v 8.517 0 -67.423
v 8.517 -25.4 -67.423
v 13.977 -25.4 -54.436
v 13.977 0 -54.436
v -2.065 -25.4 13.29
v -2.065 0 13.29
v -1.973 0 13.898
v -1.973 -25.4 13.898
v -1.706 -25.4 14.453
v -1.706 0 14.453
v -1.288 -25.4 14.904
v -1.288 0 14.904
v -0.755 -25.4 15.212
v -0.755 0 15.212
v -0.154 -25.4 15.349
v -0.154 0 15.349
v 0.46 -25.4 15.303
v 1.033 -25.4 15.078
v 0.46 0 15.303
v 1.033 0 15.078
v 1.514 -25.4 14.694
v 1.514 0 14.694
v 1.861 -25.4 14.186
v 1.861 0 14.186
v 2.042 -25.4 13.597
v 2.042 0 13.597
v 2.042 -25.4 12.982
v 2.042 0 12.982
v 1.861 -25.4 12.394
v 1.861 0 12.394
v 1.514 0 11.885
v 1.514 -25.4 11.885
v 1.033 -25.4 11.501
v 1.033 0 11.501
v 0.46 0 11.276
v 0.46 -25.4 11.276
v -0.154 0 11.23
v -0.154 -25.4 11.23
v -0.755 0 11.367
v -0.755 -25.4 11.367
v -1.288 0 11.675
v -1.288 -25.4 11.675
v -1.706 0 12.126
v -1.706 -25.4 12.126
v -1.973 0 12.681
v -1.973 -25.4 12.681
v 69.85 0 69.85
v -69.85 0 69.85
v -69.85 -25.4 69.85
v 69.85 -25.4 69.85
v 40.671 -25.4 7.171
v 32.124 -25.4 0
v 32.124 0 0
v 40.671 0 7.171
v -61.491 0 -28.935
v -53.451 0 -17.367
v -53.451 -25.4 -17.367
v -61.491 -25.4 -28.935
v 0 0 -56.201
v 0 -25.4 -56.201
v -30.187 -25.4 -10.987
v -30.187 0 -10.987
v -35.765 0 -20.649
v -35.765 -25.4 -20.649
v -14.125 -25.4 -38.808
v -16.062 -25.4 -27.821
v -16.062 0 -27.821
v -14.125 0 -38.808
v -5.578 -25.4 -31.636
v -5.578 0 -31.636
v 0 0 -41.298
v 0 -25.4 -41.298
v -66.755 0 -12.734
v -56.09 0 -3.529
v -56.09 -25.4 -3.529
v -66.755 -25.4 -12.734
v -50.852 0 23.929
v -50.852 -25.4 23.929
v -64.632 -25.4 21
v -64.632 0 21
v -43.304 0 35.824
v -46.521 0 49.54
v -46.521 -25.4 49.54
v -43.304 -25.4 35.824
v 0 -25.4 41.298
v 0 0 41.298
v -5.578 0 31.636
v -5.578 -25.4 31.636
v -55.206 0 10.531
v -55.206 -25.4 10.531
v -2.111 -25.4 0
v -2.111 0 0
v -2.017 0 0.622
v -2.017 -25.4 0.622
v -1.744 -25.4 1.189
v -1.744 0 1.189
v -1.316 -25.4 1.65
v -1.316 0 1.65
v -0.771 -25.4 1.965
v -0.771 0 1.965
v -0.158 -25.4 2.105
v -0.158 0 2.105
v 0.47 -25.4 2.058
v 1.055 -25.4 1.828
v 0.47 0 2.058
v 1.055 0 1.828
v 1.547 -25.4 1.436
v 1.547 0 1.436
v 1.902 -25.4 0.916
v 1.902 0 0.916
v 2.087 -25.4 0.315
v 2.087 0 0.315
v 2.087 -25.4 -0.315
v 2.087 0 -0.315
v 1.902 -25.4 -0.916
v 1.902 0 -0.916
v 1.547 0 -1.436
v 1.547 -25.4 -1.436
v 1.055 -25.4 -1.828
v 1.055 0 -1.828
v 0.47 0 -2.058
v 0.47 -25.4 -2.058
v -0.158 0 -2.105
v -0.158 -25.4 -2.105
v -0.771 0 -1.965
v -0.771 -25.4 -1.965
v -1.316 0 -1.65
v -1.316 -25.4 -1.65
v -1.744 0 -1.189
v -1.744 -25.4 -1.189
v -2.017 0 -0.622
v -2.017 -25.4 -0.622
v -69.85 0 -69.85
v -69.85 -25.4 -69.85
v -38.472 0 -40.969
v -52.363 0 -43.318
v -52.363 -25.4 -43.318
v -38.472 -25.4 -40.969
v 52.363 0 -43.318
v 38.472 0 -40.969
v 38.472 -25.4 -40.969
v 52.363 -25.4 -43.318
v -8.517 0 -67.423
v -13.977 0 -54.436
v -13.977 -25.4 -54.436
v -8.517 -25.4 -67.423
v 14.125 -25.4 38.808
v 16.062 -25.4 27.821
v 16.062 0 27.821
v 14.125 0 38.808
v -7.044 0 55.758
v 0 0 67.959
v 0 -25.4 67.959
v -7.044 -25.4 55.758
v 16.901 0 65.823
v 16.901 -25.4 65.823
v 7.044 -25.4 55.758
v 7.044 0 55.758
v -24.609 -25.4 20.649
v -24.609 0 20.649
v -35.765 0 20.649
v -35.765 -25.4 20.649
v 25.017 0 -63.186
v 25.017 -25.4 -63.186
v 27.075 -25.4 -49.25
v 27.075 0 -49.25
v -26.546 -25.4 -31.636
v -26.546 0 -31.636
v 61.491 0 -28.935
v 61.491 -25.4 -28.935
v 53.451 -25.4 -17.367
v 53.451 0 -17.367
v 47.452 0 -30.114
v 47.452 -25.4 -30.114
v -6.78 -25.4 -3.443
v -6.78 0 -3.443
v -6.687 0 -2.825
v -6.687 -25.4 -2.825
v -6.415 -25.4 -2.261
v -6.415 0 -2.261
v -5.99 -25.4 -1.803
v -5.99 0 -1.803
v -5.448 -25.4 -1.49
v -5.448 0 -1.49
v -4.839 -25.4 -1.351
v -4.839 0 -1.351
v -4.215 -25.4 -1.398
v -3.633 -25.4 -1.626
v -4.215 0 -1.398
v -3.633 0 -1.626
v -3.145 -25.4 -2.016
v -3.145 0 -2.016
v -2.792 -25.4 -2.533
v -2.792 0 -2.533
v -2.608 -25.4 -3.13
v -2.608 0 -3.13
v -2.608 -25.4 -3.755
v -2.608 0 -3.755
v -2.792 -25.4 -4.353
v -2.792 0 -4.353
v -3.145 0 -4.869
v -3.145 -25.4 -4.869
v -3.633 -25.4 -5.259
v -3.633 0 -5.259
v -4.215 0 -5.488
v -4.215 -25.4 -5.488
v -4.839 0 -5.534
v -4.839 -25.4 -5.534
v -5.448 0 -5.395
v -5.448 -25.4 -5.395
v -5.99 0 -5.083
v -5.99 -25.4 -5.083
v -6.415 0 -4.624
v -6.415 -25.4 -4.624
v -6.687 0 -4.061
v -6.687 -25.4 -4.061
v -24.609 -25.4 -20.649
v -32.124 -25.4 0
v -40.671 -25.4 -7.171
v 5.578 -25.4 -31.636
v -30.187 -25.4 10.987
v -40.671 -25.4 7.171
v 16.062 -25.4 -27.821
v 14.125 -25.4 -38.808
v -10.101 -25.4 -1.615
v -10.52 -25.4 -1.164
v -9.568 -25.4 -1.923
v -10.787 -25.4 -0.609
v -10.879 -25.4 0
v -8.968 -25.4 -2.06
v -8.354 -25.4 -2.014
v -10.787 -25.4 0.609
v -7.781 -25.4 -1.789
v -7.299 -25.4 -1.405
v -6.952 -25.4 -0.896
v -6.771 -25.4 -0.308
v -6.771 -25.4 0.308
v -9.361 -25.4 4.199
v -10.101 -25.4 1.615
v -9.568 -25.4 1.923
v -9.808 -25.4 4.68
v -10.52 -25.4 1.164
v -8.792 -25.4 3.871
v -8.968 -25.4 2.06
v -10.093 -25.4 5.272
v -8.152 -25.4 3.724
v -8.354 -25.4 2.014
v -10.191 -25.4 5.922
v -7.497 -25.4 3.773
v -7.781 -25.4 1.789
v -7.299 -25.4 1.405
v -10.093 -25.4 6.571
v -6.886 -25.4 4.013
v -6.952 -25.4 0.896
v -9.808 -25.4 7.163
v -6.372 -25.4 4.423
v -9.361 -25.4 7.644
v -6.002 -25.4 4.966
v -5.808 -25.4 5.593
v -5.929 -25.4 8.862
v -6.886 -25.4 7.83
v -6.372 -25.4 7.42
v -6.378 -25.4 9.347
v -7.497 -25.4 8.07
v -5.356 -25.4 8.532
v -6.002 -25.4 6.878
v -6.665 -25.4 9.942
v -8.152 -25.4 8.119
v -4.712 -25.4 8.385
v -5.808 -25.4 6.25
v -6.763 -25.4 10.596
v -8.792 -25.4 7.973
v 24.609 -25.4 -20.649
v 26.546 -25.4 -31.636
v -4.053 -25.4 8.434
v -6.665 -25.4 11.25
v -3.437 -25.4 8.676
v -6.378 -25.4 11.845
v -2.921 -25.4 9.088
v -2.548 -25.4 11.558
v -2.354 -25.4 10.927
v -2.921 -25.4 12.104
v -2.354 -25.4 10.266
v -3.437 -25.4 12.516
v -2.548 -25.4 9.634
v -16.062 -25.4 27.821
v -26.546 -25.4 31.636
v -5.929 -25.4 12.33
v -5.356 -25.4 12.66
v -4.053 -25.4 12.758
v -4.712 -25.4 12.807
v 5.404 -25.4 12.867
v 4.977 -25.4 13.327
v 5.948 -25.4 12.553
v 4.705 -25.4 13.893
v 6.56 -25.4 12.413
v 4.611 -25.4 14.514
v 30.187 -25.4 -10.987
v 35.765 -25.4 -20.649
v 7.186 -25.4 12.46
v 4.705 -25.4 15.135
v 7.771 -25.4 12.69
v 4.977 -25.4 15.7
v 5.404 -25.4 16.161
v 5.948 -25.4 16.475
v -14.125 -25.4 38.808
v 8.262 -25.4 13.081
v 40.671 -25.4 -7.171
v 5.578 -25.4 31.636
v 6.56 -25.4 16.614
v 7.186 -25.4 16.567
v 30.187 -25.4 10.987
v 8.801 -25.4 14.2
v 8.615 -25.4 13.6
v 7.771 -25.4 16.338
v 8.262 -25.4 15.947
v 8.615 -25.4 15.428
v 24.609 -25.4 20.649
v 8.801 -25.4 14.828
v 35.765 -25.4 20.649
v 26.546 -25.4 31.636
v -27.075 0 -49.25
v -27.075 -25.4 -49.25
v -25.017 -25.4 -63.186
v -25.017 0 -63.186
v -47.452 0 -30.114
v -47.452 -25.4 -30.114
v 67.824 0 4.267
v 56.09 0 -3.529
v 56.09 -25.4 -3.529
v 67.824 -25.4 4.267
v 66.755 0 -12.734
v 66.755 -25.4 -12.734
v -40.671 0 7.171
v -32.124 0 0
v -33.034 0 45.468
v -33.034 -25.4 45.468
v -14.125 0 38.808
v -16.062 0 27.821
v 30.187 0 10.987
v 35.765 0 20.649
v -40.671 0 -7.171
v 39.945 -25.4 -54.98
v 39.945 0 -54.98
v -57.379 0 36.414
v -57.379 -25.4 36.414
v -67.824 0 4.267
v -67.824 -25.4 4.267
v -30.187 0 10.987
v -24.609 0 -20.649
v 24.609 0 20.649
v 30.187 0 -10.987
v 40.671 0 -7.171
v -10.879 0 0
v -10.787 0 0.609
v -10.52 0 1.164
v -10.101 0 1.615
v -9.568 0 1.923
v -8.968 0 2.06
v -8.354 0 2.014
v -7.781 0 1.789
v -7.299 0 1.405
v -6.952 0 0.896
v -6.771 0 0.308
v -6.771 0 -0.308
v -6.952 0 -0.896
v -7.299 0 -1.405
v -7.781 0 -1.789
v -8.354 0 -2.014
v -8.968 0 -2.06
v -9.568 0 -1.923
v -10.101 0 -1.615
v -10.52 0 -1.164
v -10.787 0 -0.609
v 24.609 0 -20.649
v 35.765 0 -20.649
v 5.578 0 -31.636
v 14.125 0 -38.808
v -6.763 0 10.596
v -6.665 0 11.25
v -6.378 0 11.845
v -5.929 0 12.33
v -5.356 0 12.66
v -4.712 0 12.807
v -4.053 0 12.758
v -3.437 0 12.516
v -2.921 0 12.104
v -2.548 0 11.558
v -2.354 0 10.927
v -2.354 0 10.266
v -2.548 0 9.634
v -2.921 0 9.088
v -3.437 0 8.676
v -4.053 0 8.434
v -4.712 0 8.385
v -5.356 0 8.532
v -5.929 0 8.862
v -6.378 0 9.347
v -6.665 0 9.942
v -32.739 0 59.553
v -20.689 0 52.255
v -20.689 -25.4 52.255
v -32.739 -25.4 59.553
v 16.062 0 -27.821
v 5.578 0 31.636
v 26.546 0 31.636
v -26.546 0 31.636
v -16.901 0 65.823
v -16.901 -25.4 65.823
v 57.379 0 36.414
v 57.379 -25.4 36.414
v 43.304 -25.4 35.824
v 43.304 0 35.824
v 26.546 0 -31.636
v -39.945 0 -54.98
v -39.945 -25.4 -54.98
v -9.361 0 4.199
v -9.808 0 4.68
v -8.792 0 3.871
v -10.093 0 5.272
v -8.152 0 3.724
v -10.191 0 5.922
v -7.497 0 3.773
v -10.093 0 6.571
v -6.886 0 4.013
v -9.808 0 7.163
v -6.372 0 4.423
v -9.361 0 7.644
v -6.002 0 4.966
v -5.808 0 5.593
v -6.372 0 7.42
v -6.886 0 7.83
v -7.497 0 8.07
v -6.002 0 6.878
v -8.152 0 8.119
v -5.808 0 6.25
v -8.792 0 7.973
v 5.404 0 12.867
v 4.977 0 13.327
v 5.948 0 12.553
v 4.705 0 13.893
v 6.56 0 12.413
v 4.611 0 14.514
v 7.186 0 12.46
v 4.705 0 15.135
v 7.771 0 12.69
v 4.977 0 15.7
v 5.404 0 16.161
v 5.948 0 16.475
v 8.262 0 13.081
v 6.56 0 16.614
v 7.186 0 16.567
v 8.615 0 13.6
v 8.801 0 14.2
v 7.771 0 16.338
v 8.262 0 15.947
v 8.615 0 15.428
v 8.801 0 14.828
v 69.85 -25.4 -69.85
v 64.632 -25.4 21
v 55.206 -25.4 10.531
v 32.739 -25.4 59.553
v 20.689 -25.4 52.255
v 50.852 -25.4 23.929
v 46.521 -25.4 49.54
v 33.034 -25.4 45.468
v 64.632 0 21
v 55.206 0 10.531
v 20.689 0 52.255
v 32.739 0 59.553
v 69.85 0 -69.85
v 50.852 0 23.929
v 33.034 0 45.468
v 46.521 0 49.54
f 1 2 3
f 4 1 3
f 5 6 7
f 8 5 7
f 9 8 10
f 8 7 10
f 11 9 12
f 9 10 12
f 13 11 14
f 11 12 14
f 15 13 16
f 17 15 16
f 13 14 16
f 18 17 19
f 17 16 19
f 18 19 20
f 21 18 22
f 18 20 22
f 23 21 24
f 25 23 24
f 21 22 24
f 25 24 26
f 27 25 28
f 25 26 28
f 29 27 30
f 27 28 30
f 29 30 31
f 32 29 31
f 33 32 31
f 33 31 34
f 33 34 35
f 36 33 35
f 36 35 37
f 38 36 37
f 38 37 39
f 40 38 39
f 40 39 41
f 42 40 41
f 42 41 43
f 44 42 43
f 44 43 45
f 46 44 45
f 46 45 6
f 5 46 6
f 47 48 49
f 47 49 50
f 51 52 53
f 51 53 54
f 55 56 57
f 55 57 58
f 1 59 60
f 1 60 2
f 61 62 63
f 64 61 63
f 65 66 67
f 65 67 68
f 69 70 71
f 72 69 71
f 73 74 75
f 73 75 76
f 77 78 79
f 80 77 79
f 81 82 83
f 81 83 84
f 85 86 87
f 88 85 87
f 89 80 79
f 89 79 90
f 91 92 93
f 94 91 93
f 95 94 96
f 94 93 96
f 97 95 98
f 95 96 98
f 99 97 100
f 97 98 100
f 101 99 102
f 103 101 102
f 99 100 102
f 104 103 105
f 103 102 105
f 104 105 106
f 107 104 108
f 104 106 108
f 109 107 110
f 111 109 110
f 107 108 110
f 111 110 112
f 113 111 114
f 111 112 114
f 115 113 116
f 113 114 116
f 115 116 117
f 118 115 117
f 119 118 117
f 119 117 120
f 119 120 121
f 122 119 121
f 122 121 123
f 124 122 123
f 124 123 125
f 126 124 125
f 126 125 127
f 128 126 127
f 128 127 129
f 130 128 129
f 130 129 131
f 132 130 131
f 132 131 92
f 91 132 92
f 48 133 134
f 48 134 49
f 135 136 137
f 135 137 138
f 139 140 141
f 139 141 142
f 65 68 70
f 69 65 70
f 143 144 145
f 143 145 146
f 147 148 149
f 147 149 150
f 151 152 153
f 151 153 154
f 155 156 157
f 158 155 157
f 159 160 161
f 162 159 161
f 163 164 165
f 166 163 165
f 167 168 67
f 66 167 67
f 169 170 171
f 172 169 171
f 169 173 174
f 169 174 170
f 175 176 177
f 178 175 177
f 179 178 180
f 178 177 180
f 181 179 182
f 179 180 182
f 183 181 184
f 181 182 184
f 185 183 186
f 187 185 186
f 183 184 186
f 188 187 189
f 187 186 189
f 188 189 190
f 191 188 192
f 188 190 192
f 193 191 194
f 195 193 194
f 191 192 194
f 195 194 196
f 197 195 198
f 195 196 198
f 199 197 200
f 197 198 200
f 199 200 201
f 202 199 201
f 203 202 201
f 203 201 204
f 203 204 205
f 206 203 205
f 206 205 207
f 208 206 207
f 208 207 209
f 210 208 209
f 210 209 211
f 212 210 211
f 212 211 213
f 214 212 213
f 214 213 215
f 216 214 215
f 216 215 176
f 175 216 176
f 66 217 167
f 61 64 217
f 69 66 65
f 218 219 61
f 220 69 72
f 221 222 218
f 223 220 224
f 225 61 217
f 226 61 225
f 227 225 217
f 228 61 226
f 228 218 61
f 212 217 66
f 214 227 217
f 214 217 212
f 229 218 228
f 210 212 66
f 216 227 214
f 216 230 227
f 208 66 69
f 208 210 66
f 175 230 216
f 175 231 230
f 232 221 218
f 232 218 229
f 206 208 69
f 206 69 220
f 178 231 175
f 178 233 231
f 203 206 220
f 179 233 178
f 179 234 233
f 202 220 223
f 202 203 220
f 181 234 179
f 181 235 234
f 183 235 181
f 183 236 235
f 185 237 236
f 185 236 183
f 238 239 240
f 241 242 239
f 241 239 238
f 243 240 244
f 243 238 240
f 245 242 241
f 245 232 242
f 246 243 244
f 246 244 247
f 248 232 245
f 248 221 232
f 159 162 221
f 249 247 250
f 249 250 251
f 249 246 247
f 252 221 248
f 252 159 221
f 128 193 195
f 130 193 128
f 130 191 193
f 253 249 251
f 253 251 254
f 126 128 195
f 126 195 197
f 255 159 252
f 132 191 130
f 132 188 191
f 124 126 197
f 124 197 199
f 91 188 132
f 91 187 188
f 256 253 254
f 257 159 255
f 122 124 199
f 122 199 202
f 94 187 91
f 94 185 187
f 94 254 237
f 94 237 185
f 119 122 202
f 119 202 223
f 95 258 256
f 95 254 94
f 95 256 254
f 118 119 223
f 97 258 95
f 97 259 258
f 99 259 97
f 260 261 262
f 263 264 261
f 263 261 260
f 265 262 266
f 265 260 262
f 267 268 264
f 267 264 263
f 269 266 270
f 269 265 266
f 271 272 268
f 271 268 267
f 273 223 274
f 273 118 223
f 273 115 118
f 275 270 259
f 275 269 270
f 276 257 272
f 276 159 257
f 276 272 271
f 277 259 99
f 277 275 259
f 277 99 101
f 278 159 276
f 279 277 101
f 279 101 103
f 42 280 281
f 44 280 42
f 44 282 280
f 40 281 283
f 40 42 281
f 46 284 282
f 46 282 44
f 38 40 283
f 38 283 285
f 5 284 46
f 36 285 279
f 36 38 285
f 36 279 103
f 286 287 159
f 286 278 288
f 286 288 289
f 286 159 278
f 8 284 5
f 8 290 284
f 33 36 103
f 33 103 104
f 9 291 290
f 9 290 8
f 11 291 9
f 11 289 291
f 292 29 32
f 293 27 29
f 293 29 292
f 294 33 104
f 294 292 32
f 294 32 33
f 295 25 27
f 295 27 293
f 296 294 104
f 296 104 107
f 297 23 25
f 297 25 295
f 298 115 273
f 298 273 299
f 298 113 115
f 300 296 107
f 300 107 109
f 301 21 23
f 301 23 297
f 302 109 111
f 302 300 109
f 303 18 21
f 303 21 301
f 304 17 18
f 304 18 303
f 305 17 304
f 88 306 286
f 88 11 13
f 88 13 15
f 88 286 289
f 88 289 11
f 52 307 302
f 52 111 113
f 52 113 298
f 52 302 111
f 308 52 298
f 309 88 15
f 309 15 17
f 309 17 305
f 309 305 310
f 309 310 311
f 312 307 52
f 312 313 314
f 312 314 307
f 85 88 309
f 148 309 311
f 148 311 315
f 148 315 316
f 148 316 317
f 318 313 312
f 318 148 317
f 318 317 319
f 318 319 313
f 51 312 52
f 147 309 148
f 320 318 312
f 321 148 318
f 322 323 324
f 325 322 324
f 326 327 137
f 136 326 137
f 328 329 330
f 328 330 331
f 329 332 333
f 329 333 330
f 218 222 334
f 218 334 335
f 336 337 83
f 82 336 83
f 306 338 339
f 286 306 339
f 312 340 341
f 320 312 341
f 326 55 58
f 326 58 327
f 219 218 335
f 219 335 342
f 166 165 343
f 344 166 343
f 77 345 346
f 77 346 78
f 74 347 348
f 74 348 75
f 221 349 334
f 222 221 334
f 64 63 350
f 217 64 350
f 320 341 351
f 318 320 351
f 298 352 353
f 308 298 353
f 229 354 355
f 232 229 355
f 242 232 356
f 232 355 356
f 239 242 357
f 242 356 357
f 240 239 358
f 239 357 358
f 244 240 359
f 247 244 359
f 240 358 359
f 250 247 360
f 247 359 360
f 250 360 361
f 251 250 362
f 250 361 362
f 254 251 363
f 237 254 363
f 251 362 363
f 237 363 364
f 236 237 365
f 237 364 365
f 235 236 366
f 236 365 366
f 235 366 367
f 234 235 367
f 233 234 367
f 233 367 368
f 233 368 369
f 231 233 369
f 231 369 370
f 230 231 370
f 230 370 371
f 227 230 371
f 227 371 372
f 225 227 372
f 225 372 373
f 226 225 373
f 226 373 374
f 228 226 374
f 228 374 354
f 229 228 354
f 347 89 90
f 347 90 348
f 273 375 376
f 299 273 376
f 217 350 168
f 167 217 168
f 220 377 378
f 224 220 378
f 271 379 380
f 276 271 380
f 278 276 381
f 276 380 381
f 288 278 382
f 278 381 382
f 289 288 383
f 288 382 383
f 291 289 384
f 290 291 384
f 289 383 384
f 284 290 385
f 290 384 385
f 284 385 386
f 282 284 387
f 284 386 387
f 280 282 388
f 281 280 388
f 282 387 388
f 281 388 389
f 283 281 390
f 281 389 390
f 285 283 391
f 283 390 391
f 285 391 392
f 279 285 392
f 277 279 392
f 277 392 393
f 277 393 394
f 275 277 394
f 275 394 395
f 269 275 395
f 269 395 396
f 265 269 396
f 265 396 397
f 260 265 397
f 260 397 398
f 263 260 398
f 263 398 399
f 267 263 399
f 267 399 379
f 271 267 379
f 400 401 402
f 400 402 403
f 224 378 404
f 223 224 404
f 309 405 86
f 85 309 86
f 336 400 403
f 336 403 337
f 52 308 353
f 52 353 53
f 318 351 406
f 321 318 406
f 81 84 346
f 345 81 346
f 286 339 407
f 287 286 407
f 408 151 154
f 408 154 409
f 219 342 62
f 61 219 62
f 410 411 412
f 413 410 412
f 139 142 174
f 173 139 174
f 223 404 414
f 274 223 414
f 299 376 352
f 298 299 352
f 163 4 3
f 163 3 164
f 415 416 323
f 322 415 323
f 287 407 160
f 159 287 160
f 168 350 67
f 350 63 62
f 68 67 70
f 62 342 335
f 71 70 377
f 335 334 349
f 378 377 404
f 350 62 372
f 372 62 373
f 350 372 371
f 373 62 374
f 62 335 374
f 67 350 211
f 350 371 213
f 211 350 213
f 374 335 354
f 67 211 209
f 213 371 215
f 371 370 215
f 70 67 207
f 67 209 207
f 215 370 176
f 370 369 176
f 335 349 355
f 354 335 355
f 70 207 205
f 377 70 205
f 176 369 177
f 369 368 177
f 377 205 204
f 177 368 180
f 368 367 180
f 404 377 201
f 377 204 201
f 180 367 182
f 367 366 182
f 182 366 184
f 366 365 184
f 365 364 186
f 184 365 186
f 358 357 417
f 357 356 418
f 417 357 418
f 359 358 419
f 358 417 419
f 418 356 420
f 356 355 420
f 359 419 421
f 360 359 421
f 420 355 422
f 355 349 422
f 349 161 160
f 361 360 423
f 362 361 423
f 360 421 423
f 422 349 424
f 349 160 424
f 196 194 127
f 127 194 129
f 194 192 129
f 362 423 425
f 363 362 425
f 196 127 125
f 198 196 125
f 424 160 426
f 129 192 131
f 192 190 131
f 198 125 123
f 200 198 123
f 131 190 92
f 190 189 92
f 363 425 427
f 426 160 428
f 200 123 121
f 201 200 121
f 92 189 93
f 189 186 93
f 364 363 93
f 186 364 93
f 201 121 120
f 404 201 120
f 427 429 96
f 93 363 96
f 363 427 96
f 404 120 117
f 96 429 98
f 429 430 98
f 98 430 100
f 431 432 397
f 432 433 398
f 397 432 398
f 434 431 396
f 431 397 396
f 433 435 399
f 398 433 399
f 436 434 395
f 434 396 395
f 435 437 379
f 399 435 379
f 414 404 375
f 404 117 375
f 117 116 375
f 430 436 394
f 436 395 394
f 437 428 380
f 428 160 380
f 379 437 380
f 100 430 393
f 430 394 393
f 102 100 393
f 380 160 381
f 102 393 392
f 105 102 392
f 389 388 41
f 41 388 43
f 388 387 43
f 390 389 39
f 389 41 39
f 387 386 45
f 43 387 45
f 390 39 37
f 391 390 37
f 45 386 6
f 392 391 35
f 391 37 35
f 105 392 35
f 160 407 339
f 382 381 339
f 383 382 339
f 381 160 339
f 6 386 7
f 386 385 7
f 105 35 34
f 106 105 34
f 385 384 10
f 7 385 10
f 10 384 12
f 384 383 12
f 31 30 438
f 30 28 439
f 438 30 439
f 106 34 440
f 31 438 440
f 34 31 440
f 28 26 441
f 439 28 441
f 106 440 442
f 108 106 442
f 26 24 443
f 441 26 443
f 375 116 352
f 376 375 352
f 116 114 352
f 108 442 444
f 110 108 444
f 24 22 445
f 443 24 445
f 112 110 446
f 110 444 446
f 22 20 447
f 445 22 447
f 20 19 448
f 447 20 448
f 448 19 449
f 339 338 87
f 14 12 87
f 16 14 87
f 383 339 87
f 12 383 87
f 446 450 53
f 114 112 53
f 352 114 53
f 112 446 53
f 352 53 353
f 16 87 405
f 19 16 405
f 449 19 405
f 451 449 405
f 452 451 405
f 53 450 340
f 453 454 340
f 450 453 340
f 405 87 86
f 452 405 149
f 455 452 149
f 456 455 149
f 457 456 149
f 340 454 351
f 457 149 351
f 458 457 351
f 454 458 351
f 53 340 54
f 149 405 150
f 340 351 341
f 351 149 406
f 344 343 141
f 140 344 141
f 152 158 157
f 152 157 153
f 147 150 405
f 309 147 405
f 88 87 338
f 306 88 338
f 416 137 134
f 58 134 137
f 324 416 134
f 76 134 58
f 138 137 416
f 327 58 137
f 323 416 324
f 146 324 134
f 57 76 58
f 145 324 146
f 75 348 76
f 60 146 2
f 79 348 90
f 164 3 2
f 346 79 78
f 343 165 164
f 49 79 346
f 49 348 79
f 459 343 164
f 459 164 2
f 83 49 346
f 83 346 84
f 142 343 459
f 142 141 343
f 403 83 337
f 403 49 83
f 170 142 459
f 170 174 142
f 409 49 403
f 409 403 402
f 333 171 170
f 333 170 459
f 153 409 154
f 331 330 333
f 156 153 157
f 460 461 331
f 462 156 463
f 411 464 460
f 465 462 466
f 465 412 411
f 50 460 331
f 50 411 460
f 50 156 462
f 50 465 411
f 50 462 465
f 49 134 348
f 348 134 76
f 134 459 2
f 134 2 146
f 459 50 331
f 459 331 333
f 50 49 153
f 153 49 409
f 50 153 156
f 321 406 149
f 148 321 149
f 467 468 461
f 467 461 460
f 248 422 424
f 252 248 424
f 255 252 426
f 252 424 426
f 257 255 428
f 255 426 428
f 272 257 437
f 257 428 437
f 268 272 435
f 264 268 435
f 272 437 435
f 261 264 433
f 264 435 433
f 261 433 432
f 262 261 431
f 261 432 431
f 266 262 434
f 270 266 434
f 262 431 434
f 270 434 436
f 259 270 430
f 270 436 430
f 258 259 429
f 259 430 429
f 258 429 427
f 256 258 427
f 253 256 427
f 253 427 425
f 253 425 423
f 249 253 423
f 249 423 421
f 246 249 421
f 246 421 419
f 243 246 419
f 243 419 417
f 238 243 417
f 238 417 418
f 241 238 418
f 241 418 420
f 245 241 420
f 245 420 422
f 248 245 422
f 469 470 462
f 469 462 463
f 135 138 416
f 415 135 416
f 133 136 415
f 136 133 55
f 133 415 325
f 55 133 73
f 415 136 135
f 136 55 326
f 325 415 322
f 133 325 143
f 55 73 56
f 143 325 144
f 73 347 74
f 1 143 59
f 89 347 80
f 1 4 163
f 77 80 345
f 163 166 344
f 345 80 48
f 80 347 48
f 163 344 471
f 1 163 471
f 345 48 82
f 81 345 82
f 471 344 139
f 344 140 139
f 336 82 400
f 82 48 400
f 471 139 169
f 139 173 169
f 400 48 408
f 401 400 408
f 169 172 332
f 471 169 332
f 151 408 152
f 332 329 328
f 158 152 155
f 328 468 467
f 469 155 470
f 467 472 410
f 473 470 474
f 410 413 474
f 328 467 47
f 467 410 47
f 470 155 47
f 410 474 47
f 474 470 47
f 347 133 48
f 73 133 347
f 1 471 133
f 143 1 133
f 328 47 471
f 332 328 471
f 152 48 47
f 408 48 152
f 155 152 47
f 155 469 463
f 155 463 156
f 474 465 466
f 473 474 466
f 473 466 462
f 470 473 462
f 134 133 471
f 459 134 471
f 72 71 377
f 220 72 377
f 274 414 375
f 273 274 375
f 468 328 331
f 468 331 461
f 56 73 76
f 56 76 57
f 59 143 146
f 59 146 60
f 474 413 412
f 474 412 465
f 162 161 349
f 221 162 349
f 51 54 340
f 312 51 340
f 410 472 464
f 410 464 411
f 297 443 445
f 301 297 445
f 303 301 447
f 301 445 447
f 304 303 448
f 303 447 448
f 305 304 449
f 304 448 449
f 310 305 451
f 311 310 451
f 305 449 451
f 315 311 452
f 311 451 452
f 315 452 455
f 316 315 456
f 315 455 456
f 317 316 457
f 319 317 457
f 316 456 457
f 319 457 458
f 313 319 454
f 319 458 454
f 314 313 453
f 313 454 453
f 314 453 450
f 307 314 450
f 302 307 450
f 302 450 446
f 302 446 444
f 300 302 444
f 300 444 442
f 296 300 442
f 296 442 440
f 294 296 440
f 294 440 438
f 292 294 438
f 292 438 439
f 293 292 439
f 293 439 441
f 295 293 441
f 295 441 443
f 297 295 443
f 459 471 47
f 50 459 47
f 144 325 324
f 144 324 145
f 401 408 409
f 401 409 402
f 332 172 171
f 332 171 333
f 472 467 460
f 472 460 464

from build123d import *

# Parameters (mm, degrees)
F0_W     = 139.7
F0_H     = 139.7
F1_DEPTH = 25.4
F3_DEPTH = 25.401
F5_DEPTH = 25.4
F6_R     = 2.110793
F6_R_2   = 2.09755
F6_R_3   = 2.065664
F6_R_4   = 2.203374
F6_R_5   = 2.217346
F6_R_6   = 2.065223
F6_R_7   = 2.106406
F7_DEPTH = 25.401


with BuildPart() as f1:
    # F0 (on Front) → F1 (new body)
    with BuildSketch(Plane.XZ):
        Rectangle(F0_W, F0_H)
    extrude(amount=F1_DEPTH)

    # F2 (on Front) → F3 (cut, through all)
    with BuildSketch(Plane.XZ):
        Polygon((7.043891, 55.758138), (0, 67.958515), (-7.043891, 55.758138), (-16.900595, 65.823473), (-20.689079, 52.254649), (-32.739264, 59.552501), (-33.034297, 45.467809), (-46.520805, 49.539625), (-43.303848, 35.824058), (-57.379272, 36.413993), (-50.852459, 23.929351), (-64.632389, 21.000336), (-55.205823, 10.531074), (-67.824414, 4.26715), (-56.090402, -3.528909), (-66.754783, -12.734156), (-53.450615, -17.367157), (-61.490703, -28.935328), (-47.452329, -30.114164), (-52.362936, -43.318388), (-38.472439, -40.968986), (-39.945013, -54.979594), (-27.075184, -49.249577), (-25.017198, -63.186229), (-13.976695, -54.435635), (-8.51746, -67.422642), (0, -56.201302), (8.51746, -67.422642), (13.976695, -54.435635), (25.017198, -63.186229), (27.075184, -49.249577), (39.945013, -54.979594), (38.472439, -40.968986), (52.362936, -43.318388), (47.452329, -30.114164), (61.490703, -28.935328), (53.450615, -17.367157), (66.754783, -12.734156), (56.090402, -3.528909), (67.824414, 4.26715), (55.205823, 10.531074), (64.632389, 21.000336), (50.852459, 23.929351), (57.379272, 36.413993), (43.303848, 35.824058), (46.520805, 49.539625), (33.034297, 45.467809), (32.739264, 59.552501), (20.689079, 52.254649), (16.900595, 65.823473), align=None)
    extrude(amount=F3_DEPTH, mode=Mode.SUBTRACT)


with BuildPart() as f5:
    # F4 (on Front) → F5 (new body)
    with BuildSketch(Plane.XZ):
        Polygon((5.578344, 31.636359), (0, 41.298334), (-5.578344, 31.636359), (-14.124862, 38.807739), (-16.0622, 27.820547), (-26.546057, 31.636359), (-24.608719, 20.649167), (-35.765406, 20.649167), (-30.187062, 10.987192), (-40.670919, 7.17138), (-32.124401, 0), (-40.670919, -7.17138), (-30.187062, -10.987192), (-35.765406, -20.649167), (-24.608719, -20.649167), (-26.546057, -31.636359), (-16.0622, -27.820547), (-14.124862, -38.807739), (-5.578344, -31.636359), (0, -41.298334), (5.578344, -31.636359), (14.124862, -38.807739), (16.0622, -27.820547), (26.546057, -31.636359), (24.608719, -20.649167), (35.765406, -20.649167), (30.187062, -10.987192), (40.670919, -7.17138), (32.124401, 0), (40.670919, 7.17138), (30.187062, 10.987192), (35.765406, 20.649167), (24.608719, 20.649167), (26.546057, 31.636359), (16.0622, 27.820547), (14.124862, 38.807739), align=None)
    extrude(amount=F5_DEPTH)

    # F6 (on face) → F7 (cut, through all)
    with BuildSketch(Plane(origin=(0, 0, 0), x_dir=(-1, 0, 0), z_dir=(0, 1, 0))):
        Circle(F6_R)
        with Locations((4.682168, -3.442771)):
            Circle(F6_R_2)
        with Locations((8.813494, 0)):
            Circle(F6_R_3)
        with Locations((7.987228, 5.921566)):
            Circle(F6_R_4)
        with Locations((4.546127, 10.596058)):
            Circle(F6_R_5)
        with Locations((0, 13.28957)):
            Circle(F6_R_6)
        with Locations((-6.717654, 14.513894)):
            Circle(F6_R_7)
    extrude(amount=-F7_DEPTH, mode=Mode.SUBTRACT)


solid = Compound([f1.part, f5.part])
